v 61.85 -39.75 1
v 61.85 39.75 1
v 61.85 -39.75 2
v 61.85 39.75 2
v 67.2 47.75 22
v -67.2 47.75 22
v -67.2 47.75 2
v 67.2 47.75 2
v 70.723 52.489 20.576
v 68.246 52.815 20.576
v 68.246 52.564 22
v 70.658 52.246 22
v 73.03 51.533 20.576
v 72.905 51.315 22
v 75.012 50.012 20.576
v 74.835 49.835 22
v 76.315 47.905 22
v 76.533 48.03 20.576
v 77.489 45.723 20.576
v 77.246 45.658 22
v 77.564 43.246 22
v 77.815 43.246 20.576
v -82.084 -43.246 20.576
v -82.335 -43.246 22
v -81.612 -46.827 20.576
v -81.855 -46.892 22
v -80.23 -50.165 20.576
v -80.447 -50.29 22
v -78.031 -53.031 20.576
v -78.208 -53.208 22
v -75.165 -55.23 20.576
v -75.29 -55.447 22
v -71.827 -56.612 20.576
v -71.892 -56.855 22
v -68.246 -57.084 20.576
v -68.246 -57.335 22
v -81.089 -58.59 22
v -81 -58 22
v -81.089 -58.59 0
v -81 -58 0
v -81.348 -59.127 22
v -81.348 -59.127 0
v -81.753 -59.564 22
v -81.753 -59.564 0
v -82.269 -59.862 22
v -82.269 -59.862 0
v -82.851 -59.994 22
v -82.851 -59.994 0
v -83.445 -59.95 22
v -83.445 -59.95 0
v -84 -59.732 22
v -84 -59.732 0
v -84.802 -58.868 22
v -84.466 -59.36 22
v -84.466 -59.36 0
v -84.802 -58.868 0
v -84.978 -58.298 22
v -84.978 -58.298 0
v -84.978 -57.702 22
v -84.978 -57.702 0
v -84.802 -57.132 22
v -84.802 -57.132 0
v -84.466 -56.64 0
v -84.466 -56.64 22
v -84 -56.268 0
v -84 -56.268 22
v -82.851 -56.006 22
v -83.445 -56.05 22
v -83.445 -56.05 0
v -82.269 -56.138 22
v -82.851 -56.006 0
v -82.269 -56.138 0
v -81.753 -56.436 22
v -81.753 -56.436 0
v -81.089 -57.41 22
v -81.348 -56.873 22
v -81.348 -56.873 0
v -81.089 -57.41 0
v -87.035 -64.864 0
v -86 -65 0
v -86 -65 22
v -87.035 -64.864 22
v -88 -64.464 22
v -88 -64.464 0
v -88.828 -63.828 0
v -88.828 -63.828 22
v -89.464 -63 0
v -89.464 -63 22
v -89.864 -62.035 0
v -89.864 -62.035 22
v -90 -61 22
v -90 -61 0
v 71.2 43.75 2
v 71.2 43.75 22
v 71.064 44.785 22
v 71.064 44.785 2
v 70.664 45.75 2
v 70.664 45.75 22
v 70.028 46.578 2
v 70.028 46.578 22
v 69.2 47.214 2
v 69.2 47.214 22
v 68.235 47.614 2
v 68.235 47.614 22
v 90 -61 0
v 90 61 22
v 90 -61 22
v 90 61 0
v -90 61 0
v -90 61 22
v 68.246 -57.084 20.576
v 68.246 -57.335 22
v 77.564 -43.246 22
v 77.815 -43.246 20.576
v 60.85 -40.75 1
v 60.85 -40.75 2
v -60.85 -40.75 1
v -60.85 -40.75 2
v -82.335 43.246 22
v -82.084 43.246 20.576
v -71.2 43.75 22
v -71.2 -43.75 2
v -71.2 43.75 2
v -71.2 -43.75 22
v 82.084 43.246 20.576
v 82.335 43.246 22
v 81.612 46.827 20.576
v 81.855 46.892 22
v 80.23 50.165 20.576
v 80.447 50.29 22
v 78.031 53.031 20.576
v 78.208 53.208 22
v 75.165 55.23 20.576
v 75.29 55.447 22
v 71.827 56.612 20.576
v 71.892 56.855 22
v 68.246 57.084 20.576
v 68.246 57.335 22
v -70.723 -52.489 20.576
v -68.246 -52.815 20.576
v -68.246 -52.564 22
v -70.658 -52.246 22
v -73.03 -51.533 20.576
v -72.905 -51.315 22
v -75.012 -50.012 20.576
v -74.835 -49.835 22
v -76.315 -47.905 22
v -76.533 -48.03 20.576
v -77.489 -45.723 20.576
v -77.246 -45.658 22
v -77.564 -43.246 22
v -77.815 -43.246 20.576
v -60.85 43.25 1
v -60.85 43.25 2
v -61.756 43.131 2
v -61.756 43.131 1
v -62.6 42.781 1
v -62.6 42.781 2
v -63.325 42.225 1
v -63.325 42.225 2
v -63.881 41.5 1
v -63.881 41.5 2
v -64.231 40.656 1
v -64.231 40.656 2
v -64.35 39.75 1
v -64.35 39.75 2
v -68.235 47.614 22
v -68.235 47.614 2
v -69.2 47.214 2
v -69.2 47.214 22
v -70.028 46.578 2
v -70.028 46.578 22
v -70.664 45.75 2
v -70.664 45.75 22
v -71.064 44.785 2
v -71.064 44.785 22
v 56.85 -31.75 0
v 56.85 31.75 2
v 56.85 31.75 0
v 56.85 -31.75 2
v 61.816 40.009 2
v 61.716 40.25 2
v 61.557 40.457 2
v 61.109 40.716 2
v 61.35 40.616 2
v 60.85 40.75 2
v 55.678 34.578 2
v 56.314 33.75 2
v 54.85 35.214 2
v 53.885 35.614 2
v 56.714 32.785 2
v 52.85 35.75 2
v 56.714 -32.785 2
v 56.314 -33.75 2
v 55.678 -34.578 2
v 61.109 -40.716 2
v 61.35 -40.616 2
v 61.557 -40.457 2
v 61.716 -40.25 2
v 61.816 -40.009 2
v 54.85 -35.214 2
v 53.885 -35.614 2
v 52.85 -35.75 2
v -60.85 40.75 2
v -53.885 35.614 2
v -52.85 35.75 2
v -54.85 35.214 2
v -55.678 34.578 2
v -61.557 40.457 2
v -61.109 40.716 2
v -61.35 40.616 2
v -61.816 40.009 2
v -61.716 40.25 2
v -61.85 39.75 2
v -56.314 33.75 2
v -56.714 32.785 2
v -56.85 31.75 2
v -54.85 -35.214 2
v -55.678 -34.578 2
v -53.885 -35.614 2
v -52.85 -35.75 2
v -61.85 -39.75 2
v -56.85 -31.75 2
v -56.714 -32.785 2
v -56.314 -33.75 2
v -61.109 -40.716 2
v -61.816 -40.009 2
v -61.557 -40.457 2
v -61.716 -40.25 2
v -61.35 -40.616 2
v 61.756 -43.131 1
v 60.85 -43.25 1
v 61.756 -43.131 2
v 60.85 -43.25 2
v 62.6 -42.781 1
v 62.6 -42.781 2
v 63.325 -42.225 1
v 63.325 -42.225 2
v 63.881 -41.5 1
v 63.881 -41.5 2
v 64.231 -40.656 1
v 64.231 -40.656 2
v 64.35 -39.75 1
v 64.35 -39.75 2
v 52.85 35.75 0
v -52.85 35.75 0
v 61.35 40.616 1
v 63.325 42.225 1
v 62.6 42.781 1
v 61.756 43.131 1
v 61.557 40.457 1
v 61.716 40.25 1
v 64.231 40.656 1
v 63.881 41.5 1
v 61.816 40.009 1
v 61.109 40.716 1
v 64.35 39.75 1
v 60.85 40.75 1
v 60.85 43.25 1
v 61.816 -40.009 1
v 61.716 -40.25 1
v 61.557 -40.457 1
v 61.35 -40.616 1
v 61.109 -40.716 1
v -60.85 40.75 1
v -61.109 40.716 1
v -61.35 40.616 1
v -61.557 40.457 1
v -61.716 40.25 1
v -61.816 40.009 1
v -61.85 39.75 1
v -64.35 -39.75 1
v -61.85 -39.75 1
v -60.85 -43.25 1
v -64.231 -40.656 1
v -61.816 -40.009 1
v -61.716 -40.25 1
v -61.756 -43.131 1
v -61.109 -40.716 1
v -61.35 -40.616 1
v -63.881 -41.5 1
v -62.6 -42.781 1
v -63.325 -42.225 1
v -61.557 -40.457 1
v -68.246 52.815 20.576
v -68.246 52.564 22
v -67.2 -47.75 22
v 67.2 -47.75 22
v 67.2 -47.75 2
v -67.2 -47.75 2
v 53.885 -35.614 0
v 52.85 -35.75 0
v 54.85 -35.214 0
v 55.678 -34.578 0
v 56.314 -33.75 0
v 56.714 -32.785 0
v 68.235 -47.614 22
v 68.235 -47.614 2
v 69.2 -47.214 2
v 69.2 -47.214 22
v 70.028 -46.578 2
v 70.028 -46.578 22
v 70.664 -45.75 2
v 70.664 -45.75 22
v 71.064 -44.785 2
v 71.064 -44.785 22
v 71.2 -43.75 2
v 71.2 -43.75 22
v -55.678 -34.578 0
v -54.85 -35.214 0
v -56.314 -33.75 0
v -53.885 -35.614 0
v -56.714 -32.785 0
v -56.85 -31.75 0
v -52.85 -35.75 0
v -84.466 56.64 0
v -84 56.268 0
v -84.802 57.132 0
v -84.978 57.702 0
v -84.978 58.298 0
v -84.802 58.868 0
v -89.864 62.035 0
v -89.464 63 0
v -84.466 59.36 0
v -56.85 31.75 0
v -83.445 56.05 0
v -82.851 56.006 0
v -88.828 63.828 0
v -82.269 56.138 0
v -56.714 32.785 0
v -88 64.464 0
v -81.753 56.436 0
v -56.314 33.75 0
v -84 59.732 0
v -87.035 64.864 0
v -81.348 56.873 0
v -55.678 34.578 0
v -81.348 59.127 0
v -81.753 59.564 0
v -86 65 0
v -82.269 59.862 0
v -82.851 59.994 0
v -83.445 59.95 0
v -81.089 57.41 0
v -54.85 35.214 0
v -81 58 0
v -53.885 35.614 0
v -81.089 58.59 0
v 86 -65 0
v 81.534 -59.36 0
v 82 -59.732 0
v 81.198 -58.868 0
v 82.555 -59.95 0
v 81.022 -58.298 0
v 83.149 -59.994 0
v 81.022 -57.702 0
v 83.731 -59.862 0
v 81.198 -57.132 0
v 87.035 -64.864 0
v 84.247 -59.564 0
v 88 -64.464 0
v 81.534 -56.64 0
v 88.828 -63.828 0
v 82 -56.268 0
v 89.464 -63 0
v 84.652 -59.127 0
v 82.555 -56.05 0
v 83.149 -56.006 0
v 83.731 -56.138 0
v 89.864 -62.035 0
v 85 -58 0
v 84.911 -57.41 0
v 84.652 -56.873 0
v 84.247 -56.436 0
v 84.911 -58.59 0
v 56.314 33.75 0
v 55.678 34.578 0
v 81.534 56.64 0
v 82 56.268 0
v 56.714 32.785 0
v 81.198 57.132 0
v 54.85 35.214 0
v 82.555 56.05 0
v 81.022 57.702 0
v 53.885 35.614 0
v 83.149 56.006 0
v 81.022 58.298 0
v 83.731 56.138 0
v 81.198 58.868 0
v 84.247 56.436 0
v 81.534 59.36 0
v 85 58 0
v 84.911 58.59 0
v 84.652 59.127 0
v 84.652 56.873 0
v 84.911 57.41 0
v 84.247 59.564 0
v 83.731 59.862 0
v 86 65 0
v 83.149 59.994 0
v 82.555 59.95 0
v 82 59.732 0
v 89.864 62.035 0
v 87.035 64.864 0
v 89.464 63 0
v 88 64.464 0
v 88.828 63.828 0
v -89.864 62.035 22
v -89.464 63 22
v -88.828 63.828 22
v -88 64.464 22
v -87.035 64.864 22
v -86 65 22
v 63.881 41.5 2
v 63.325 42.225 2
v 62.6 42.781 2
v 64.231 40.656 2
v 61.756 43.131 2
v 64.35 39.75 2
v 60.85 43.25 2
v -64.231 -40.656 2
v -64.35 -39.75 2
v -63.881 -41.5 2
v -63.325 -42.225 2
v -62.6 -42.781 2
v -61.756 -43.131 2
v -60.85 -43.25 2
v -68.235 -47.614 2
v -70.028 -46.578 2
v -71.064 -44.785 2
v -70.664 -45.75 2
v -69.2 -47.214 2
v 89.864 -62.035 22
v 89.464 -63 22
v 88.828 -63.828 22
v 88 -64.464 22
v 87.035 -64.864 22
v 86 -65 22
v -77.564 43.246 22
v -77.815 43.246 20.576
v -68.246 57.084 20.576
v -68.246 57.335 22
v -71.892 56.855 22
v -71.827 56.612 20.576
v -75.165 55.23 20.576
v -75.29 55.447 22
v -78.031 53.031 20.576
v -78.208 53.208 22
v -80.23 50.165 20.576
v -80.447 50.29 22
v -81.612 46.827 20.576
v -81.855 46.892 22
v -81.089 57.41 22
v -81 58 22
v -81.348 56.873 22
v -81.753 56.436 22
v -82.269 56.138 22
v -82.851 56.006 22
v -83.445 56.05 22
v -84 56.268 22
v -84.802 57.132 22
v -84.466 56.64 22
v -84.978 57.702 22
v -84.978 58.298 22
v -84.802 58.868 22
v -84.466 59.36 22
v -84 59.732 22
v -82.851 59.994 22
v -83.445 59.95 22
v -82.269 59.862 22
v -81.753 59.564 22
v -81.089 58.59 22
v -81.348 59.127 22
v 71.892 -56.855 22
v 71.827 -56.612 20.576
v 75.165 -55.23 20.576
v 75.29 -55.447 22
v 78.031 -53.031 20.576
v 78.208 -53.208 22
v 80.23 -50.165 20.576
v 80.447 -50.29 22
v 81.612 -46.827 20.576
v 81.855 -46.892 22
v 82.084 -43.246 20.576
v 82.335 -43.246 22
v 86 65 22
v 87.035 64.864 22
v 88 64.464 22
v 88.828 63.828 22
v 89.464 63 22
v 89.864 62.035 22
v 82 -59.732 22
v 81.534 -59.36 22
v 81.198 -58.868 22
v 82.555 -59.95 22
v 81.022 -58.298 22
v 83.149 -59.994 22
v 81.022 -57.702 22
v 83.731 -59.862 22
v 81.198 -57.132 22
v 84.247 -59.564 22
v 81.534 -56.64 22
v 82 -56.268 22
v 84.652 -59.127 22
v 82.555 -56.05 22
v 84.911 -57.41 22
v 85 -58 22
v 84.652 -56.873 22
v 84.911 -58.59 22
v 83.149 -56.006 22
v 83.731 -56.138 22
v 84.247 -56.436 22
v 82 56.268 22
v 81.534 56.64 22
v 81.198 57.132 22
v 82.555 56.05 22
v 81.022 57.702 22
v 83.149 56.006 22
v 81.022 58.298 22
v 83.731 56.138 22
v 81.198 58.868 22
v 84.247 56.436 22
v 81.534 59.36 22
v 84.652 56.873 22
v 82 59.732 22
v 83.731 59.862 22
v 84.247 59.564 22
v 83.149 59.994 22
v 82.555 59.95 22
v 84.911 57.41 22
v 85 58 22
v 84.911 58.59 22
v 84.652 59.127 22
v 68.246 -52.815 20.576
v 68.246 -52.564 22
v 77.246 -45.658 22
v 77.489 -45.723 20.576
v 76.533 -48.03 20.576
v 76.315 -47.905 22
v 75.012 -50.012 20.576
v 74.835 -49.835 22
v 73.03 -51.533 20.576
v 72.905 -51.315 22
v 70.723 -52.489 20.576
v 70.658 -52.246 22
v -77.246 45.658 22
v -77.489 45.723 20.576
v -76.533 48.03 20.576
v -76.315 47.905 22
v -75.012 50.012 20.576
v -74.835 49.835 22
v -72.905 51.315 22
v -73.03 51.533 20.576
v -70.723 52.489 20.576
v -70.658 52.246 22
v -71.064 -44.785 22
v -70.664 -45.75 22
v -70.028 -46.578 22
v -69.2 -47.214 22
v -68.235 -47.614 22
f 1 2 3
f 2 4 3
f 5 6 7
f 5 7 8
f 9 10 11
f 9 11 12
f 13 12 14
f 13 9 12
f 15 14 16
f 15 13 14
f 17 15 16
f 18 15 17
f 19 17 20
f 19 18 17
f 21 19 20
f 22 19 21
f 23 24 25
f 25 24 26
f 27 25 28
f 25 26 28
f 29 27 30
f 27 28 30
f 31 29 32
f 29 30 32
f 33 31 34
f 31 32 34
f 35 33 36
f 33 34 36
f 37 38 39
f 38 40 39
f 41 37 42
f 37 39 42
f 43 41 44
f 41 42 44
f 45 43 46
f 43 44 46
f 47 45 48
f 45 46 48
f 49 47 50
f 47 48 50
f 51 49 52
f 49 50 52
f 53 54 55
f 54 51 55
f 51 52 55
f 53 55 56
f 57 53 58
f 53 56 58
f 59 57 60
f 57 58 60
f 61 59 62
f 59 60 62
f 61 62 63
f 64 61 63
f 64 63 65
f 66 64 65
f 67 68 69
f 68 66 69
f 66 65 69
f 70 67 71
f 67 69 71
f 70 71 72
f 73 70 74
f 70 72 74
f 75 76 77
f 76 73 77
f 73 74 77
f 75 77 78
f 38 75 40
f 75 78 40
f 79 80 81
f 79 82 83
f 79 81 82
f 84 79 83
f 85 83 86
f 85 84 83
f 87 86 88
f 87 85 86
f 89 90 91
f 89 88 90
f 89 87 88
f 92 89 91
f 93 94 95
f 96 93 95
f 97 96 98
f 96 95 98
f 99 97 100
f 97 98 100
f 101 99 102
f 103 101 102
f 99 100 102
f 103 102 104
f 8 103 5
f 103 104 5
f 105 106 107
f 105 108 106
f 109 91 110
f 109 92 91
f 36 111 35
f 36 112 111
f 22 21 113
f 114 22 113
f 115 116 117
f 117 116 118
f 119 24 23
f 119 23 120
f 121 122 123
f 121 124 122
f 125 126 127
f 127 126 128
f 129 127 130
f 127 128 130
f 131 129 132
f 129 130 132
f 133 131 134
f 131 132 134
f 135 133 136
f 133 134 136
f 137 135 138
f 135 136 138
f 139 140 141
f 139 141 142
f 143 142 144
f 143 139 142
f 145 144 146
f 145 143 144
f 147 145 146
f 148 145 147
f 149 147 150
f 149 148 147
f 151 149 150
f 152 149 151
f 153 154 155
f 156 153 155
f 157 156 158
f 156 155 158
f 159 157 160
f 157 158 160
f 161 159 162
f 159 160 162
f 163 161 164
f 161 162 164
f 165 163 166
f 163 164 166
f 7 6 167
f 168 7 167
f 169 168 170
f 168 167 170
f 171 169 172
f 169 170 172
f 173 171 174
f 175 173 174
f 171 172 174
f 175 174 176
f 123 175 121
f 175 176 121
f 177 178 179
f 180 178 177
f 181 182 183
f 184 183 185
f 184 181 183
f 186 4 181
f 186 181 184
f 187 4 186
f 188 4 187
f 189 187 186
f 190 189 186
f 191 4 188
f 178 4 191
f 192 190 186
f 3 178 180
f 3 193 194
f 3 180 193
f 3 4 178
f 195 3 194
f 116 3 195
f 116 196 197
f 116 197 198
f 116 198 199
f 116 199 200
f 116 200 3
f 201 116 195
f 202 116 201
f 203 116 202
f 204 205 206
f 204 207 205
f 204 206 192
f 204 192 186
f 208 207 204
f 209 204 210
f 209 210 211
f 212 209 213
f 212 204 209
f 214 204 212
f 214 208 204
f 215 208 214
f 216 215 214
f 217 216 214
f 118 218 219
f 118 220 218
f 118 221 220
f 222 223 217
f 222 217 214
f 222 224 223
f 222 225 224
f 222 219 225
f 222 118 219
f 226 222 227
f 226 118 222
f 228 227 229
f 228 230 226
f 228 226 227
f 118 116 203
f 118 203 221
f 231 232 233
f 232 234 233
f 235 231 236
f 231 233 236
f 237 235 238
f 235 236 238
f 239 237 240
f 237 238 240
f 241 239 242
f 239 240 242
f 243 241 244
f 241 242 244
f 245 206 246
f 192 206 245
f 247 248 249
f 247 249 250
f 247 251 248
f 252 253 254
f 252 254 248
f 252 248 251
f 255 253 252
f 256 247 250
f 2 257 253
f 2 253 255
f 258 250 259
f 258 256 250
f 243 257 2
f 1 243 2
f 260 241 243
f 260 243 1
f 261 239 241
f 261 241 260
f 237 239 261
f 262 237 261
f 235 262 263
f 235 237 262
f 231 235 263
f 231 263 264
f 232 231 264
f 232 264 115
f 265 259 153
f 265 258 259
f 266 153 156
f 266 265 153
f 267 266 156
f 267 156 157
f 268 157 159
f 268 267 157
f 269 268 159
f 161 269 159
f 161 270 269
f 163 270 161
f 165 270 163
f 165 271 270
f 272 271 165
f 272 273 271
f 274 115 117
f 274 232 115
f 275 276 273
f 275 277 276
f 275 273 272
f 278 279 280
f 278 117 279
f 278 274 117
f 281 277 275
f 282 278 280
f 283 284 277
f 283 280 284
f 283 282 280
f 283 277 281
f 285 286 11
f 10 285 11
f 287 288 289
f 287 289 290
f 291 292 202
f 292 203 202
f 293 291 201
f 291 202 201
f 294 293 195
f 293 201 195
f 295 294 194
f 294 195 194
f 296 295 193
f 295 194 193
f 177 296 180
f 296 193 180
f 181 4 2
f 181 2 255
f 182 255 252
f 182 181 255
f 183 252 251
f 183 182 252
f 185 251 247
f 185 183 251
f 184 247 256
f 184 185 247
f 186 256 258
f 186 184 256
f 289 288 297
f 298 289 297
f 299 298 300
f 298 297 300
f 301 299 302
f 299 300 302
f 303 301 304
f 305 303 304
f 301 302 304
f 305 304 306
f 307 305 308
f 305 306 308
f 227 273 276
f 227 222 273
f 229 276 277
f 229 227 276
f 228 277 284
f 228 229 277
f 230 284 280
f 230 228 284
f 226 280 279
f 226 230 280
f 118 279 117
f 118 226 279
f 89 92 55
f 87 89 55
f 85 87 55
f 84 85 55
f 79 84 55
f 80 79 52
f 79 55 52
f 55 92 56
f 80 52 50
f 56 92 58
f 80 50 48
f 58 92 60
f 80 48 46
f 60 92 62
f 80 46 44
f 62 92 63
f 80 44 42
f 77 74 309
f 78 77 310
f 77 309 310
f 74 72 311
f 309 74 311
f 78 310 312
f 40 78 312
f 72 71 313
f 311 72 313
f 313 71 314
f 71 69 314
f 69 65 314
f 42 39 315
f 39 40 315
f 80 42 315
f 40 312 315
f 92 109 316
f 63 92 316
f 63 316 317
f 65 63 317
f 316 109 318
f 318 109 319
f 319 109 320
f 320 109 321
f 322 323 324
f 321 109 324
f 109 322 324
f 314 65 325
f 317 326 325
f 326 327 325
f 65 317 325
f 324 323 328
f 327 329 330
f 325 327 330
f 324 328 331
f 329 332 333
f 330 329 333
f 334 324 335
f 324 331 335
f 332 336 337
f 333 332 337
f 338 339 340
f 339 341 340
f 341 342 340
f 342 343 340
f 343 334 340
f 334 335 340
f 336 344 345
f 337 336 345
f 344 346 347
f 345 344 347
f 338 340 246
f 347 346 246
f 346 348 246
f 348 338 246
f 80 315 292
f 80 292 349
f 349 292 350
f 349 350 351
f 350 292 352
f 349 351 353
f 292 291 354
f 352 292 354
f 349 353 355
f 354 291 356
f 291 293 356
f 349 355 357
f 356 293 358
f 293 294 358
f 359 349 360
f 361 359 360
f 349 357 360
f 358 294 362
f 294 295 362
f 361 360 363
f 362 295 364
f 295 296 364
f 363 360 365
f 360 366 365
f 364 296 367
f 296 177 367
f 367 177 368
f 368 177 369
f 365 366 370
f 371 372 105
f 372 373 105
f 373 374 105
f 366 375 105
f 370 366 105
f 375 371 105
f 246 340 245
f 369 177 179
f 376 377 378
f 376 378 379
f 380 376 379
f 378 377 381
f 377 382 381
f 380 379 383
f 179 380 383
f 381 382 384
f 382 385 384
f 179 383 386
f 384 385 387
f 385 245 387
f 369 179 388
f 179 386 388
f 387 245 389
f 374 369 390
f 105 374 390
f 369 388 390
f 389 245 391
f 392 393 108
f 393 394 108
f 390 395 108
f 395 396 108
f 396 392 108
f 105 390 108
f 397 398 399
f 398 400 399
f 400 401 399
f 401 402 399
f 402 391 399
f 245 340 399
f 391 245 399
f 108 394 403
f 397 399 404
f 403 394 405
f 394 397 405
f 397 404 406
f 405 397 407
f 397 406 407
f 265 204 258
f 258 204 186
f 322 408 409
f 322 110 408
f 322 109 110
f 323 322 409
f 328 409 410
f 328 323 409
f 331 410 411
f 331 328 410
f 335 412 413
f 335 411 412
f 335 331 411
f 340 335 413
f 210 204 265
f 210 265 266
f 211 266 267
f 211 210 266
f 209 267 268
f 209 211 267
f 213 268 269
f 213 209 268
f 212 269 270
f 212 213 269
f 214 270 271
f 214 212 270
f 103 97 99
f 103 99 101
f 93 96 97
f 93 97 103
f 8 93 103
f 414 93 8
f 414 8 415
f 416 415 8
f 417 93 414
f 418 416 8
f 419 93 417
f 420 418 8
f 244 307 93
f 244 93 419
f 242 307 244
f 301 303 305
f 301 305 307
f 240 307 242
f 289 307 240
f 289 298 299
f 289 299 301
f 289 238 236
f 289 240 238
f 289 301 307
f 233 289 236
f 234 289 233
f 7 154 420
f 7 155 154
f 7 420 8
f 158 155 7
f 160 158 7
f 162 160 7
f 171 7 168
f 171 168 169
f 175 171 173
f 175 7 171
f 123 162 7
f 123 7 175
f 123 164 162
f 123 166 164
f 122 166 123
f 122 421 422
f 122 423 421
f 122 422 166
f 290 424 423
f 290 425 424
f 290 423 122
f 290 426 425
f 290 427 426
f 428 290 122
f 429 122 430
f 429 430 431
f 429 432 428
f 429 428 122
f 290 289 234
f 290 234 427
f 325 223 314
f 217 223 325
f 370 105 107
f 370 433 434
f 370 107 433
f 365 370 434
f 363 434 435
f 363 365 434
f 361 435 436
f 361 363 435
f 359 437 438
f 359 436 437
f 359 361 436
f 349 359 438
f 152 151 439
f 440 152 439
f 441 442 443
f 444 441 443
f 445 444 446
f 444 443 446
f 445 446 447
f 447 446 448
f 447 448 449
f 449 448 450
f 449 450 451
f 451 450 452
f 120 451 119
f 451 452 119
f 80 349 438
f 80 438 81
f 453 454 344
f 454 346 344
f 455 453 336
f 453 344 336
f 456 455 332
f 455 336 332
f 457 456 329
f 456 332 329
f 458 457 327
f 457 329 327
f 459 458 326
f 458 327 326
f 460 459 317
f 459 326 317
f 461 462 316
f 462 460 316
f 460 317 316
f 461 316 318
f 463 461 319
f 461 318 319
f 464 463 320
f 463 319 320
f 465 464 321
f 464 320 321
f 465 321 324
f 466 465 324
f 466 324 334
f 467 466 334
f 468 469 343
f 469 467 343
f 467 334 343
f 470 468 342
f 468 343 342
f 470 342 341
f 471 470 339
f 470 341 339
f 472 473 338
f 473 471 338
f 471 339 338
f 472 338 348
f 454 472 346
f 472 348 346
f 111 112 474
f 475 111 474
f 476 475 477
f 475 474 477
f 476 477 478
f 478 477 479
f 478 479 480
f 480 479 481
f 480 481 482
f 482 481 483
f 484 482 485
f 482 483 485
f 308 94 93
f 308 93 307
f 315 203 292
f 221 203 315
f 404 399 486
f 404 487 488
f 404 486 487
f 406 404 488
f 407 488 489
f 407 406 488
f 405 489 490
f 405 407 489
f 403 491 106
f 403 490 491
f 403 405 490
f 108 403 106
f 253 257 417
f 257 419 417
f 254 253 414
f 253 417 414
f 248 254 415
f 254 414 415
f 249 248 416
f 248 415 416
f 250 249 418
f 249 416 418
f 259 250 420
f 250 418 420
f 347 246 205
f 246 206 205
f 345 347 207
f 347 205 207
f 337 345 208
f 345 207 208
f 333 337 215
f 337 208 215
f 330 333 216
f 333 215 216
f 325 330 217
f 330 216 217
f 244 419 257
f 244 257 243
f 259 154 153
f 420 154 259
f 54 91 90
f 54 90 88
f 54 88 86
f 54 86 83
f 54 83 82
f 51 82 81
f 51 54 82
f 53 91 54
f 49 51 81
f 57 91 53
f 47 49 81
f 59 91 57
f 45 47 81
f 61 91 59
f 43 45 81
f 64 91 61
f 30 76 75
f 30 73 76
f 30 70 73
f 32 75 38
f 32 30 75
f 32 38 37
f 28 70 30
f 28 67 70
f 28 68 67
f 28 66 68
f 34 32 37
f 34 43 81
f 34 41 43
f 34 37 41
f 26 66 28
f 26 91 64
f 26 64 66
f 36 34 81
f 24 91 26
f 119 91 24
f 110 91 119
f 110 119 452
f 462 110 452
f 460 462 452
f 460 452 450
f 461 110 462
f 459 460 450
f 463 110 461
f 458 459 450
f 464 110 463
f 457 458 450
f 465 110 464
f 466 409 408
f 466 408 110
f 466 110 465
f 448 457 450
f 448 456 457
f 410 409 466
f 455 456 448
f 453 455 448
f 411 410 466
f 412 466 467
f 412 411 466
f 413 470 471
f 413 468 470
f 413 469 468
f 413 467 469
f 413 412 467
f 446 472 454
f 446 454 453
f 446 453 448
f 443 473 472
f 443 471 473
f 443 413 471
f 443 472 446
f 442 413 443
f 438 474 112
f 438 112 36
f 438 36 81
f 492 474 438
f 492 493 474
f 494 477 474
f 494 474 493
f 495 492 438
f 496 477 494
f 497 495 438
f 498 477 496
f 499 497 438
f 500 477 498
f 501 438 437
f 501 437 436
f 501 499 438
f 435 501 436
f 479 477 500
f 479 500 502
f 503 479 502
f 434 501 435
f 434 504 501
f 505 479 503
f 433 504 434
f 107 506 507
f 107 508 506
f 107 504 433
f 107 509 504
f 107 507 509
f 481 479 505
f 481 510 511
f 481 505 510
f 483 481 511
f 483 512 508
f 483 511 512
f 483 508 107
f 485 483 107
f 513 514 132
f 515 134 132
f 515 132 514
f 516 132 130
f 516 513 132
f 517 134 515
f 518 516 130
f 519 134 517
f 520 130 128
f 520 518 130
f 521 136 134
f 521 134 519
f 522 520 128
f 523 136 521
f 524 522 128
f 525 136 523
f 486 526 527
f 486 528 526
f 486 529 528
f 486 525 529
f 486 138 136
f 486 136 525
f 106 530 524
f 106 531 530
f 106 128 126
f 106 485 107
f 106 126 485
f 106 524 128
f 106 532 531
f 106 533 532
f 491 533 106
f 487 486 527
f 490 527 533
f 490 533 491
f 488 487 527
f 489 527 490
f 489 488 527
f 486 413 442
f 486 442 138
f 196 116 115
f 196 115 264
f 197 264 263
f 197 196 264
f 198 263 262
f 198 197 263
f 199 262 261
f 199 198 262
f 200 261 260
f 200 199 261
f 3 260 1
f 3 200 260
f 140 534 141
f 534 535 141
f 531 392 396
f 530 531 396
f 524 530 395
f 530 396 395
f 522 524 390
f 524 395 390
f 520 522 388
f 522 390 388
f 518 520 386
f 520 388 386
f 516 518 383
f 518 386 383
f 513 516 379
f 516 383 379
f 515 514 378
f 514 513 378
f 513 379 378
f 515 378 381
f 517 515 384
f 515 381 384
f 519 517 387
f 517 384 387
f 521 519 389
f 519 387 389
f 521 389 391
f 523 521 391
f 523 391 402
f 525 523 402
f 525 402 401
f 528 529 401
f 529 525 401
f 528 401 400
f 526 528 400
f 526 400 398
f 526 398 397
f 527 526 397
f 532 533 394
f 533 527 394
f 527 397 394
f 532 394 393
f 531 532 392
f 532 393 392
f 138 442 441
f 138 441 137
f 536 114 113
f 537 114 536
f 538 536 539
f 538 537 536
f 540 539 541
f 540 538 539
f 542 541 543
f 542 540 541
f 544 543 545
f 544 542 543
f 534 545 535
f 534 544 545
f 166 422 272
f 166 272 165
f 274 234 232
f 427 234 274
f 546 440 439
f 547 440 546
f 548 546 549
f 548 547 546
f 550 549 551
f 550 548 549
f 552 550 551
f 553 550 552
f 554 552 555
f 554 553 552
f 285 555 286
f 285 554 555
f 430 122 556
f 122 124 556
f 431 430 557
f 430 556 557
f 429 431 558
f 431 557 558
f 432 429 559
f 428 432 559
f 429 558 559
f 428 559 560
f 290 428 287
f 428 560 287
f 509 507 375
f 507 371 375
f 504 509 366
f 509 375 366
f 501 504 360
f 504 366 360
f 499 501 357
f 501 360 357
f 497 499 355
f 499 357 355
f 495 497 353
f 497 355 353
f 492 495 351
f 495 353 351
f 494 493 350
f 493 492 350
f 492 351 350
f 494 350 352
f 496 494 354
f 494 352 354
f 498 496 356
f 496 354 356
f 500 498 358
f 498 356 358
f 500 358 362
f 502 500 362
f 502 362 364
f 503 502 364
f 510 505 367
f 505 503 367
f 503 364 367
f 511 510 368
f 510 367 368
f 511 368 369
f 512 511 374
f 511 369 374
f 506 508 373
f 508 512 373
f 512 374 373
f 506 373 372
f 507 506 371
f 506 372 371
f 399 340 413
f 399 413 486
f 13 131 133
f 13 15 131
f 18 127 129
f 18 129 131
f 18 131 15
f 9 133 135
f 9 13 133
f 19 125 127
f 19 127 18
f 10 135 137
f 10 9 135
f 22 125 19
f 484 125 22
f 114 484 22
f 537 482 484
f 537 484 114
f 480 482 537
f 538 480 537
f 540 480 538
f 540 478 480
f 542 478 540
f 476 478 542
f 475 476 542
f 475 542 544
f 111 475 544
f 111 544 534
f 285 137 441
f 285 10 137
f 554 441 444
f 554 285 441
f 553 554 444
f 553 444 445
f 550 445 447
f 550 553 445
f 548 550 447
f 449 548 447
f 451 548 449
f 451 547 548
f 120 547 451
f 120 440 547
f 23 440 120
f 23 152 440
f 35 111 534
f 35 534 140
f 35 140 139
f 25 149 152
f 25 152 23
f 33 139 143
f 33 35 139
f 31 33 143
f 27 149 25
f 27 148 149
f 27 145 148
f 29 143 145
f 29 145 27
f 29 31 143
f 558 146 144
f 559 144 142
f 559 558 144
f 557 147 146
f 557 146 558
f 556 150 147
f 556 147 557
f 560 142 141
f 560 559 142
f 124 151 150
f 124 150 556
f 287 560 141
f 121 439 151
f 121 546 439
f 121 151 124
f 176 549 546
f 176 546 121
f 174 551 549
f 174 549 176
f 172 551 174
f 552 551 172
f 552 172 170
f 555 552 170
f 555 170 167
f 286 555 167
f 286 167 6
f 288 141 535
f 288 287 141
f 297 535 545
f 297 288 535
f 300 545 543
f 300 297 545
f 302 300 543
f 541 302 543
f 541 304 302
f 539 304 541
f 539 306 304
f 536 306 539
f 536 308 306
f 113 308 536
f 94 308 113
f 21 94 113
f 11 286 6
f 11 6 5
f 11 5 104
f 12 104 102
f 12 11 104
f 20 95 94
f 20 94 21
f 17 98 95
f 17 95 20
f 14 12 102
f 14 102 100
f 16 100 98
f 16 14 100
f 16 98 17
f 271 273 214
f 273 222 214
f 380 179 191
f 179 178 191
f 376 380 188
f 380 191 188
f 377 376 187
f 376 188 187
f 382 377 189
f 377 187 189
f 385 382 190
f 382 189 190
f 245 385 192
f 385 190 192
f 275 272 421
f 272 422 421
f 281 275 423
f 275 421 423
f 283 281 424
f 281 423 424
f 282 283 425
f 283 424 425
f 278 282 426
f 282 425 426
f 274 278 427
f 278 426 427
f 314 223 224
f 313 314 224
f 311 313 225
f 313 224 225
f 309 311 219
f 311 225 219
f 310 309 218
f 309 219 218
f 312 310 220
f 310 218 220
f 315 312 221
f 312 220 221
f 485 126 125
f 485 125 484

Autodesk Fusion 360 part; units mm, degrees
sketch "Sketch1" plane through (0, 0, 0) normal (0, 0, 1) x (1, 0, 0)
  line L0 (86, -65) -> (-86, -65)
  line L1 (-90, -61) -> (-90, 61)
  line L2 (-86, 65) -> (86, 65)
  line L3 (90, 61) -> (90, -61)
  line L4 (90, -65) -> (-90, 65) construction
  line L5 (-90, -65) -> (90, 65) construction
  arc A0 (-86, 65) -> (-90, 61) centre (-86, 61) ccw
  arc A1 (90, 61) -> (86, 65) centre (86, 61) ccw
  arc A2 (86, -65) -> (90, -61) centre (86, -61) ccw
  arc A3 (-90, -61) -> (-86, -65) centre (-86, -61) ccw
  circle A4 centre (-83, 58) radius 2
  line L6 (0, 65) -> (0, -65) construction
  line L7 (90, 0) -> (-90, 0) construction
  circle A5 centre (83, 58) radius 2
  circle A6 centre (83, -58) radius 2
  circle A7 centre (-83, -58) radius 2
  dimension "d1" = 180
  dimension "d2" = 130
  dimension "d26" = 4
  dimension "d27" = 4
  dimension "d28" = 4
  dimension "d29" = 4
  dimension "d30" = 4
  dimension "d31" = 7
  dimension "d32" = 7
extrude "Extrude1" add sketch "Sketch1" along normal blind 22
sketch "Sketch2" plane through (0, 0, 22) normal (0, 0, 1) x (-1, 0, 0)
  line L0 (-86, -65) -> (86, -65)
  line L1 (90, -61) -> (90, 61)
  line L2 (86, 65) -> (-86, 65)
  line L3 (-90, 61) -> (-90, -61)
  line L4 (-67.2, 47.75) -> (67.2, 47.75)
  line L5 (71.2, 43.75) -> (71.2, -43.75)
  line L6 (67.2, -47.75) -> (-67.2, -47.75)
  line L7 (-71.2, -43.75) -> (-71.2, 43.75)
  line L8 (-71.2, 47.75) -> (71.2, -47.75) construction
  line L9 (71.2, 47.75) -> (-71.2, -47.75) construction
  arc A0 (86, -65) -> (90, -61) centre (86, -61) ccw
  arc A1 (90, 61) -> (86, 65) centre (86, 61) ccw
  arc A2 (-86, 65) -> (-90, 61) centre (-86, 61) ccw
  arc A3 (-90, -61) -> (-86, -65) centre (-86, -61) ccw
  circle A4 centre (83, 58) radius 2
  circle A5 centre (-83, 58) radius 2
  circle A6 centre (-83, -58) radius 2
  circle A7 centre (83, -58) radius 2
  arc A8 (67.2, -47.75) -> (71.2, -43.75) centre (67.2, -43.75) ccw
  arc A9 (-71.2, -43.75) -> (-67.2, -47.75) centre (-67.2, -43.75) ccw
  arc A10 (71.2, 43.75) -> (67.2, 47.75) centre (67.2, 43.75) ccw
  arc A11 (-67.2, 47.75) -> (-71.2, 43.75) centre (-67.2, 43.75) ccw
  dimension "d5" = 142.4
  dimension "d6" = 95.5
  dimension "d52" = 4
  dimension "d53" = 4
  dimension "d54" = 4
  dimension "d55" = 4
extrude "Extrude2" cut sketch "Sketch2" against normal blind 20 contours L4 L5 L6 L7 A8 A9 A10 A11
sketch "Sketch3" plane through (0, 0, 22) normal (0, 0, 1) x (-1, 0, 0)
  line L0 (71.2, 43.75) -> (71.2, -43.75)
  line L1 (67.2, -47.75) -> (-67.2, -47.75)
  line L2 (-71.2, -43.75) -> (-71.2, 43.75)
  line L3 (-67.2, 47.75) -> (67.2, 47.75)
  line L4 (-86, -65) -> (86, -65)
  line L5 (90, -61) -> (90, 61)
  line L6 (86, 65) -> (-86, 65)
  line L7 (-90, 61) -> (-90, -61)
  line L8 (-79.9494, 54.9494) -> (79.9494, 54.9494) construction
  line L9 (79.9494, 54.9494) -> (79.9494, -54.9494) construction
  line L10 (79.9494, -54.9494) -> (-79.9494, -54.9494) construction
  line L11 (-79.9494, -54.9494) -> (-79.9494, 54.9494) construction
  line L12 (-79.9494, 54.9494) -> (79.9494, -54.9494) construction
  line L13 (79.9494, 54.9494) -> (-79.9494, -54.9494) construction
  line L14 (77.8149, 43.2459) -> (77.8149, -43.2459)
  line L15 (68.2459, -52.8149) -> (-68.2459, -52.8149)
  line L16 (-77.8149, -43.2459) -> (-77.8149, 43.2459)
  line L17 (-69.6267, 47.2574) -> (77.8149, -52.8149) construction
  line L18 (70.6619, 45.6619) -> (-70.6619, -45.6619) construction
  line L19 (-68.2459, 57.0839) -> (68.2459, 57.0839)
  line L20 (82.0839, 43.2459) -> (82.0839, -43.2459)
  line L21 (68.2459, -57.0839) -> (-68.2459, -57.0839)
  line L22 (-82.0839, -43.2459) -> (-82.0839, 43.2459)
  line L23 (-72.3401, 50.3077) -> (82.0839, -57.0839) construction
  line L24 (73.5309, 48.5309) -> (-73.5309, -48.5309) construction
  arc A0 (68.2459, -52.8149) -> (77.8149, -43.2459) centre (68.2459, -43.2459) ccw
  arc A1 (68.2459, -57.0839) -> (82.0839, -43.2459) centre (68.2459, -43.2459) ccw
  line L25 (0, -65) -> (0, 65) construction
  line L26 (-90, 0) -> (90, 0) construction
  arc A2 (-77.8149, -43.2459) -> (-68.2459, -52.8149) centre (-68.2459, -43.2459) ccw
  arc A3 (-82.0839, -43.2459) -> (-68.2459, -57.0839) centre (-68.2459, -43.2459) ccw
  arc A4 (-68.2459, 52.8149) -> (-77.8149, 43.2459) centre (-68.2459, 43.2459) ccw
  arc A5 (-68.2459, 57.0839) -> (-82.0839, 43.2459) centre (-68.2459, 43.2459) ccw
  arc A6 (77.8149, 43.2459) -> (68.2459, 52.8149) centre (68.2459, 43.2459) ccw
  arc A7 (82.0839, 43.2459) -> (68.2459, 57.0839) centre (68.2459, 43.2459) ccw
  line L27 (-68.2459, 52.8149) -> (68.2459, 52.8149)
  arc A8 (86, -65) -> (90, -61) centre (86, -61) ccw
  arc A9 (90, 61) -> (86, 65) centre (86, 61) ccw
  arc A10 (-86, 65) -> (-90, 61) centre (-86, 61) ccw
  arc A11 (-90, -61) -> (-86, -65) centre (-86, -61) ccw
  circle A12 centre (83, 58) radius 2
  circle A13 centre (-83, 58) radius 2
  circle A14 centre (-83, -58) radius 2
  circle A15 centre (83, -58) radius 2
  arc A16 (71.2, 43.75) -> (67.2, 47.75) centre (67.2, 43.75) ccw
  arc A17 (67.2, -47.75) -> (71.2, -43.75) centre (67.2, -43.75) ccw
  arc A18 (-71.2, -43.75) -> (-67.2, -47.75) centre (-67.2, -43.75) ccw
  arc A19 (-67.2, 47.75) -> (-71.2, 43.75) centre (-67.2, 43.75) ccw
  dimension "d9" = 159.8988
  dimension "d15" = 109.8988
  dimension "d16" = 2.1345
  dimension "d17" = 2.1345
  dimension "d18" = 2.1345
  dimension "d19" = 2.1345
  dimension "d20" = 9.569
  dimension "d21" = 13.838
extrude "Extrude3" cut sketch "Sketch3" against normal blind 1.424 contours L19 L20 L21 L22 A1 A3 A5 A7
draft "Draft1" angle 10 neutral plane through (0, 0, 20.576) pull (0, 0, 1) 16 faces at (-77.8149, -14.4153, 21.5253) (-71.8024, 52.1295, 21.0507) (-22.7486, 52.8149, 21.5253) (72.6307, 51.7512, 21.0507) (77.8149, 14.4153, 21.5253) (73.0304, -51.5329, 21.0507) (22.7486, -52.8149, 21.5253) (-77.1295, -46.8024, 21.0507) (-82.0839, -14.4153, 21.5253) (-76.2727, -54.518, 21.0507) (-22.7486, -57.0839, 21.0507) (82.0213, -44.5613, 21.0507) (82.0839, 14.4153, 21.5253) (77.7952, 53.2609, 21.0507) (22.7486, 57.0839, 21.0507) (-76.8, 54.1233, 21.0507)
sketch "Sketch6" plane through (0, 0, 2) normal (0, 0, 1) x (-1, 0, 0)
  arc A0 (71.2, 43.75) -> (67.2, 47.75) centre (67.2, 43.75) ccw
  line L0 (67.2, 47.75) -> (-67.2, 47.75)
  arc A1 (-67.2, 47.75) -> (-71.2, 43.75) centre (-67.2, 43.75) ccw
  line L1 (-71.2, 43.75) -> (-71.2, -43.75)
  arc A2 (-71.2, -43.75) -> (-67.2, -47.75) centre (-67.2, -43.75) ccw
  line L2 (-67.2, -47.75) -> (67.2, -47.75)
  arc A3 (67.2, -47.75) -> (71.2, -43.75) centre (67.2, -43.75) ccw
  line L3 (71.2, -43.75) -> (71.2, 43.75)
  arc A4 (60.9079, -41.3399) -> (62.4799, -39.7679) centre (60.9079, -39.7679) ccw construction
  arc A5 (-62.4799, -39.7399) -> (-60.9079, -41.3119) centre (-60.9079, -39.7399) ccw construction
  line L4 (-48.9575, -41.8399) -> (48.9575, -41.8399) construction
  line L5 (48.9575, 41.8399) -> (-48.9575, 41.8399) construction
  line L6 (-62.9799, 29.7119) -> (-62.9799, 27.8175) construction
  line L7 (48.9575, -41.8399) -> (50.8519, -41.8399) construction
  line L8 (62.4799, 30.3078) -> (62.4799, 39.7679) construction
  arc A6 (-60.88, 42.74) -> (-63.88, 39.74) centre (-60.88, 39.74) ccw construction
  line L9 (63.88, 39.74) -> (63.88, -39.74) construction
  arc A7 (63.88, 39.74) -> (60.88, 42.74) centre (60.88, 39.74) ccw construction
  line L10 (-62.9799, -29.7119) -> (-62.4799, -30.3078) construction
  line L11 (51.4478, 41.3399) -> (50.8519, 41.8399) construction
  arc A8 (60.88, -42.74) -> (63.88, -39.74) centre (60.88, -39.74) ccw construction
  line L12 (-48.9575, 41.8399) -> (-50.8519, 41.8399) construction
  line L13 (-60.88, 42.74) -> (60.88, 42.74) construction
  line L14 (-62.9799, -27.8175) -> (-62.9799, -29.7119) construction
  line L15 (60.88, -42.74) -> (-60.88, -42.74) construction
  line L16 (62.9799, 29.7119) -> (62.4799, 30.3078) construction
  line L17 (-50.8519, 41.8399) -> (-51.4811, 41.3119) construction
  line L18 (62.4799, -39.7679) -> (62.4799, -30.3078) construction
  line L19 (-50.8519, -41.8399) -> (-48.9575, -41.8399) construction
  line L20 (60.9079, 41.3399) -> (51.4478, 41.3399) construction
  line L21 (50.8519, 41.8399) -> (48.9575, 41.8399) construction
  line L22 (62.9799, 27.8175) -> (62.9799, 29.7119) construction
  line L23 (51.4478, -41.3399) -> (60.9079, -41.3399) construction
  line L24 (62.9799, -27.8175) -> (62.9799, 27.8175) construction
  line L25 (-63.88, -39.74) -> (-63.88, 39.74) construction
  line L26 (50.8519, -41.8399) -> (51.4478, -41.3399) construction
  line L27 (62.9799, -29.7119) -> (62.9799, -27.8175) construction
  arc A9 (-63.88, -39.74) -> (-60.88, -42.74) centre (-60.88, -39.74) ccw construction
  arc A10 (62.4799, 39.7679) -> (60.9079, 41.3399) centre (60.9079, 39.7679) ccw construction
  line L28 (62.4799, -30.3078) -> (62.9799, -29.7119) construction
  line L29 (-62.4799, 30.3078) -> (-62.9799, 29.7119) construction
  line L30 (-60.9079, -41.3119) -> (-51.4811, -41.3119) construction
  arc A11 (-60.9079, 41.3119) -> (-62.4799, 39.7399) centre (-60.9079, 39.7399) ccw construction
  line L31 (-51.4811, -41.3119) -> (-50.8519, -41.8399) construction
  line L32 (-51.4811, 41.3119) -> (-60.9079, 41.3119) construction
  line L33 (-62.4799, 39.7399) -> (-62.4799, 30.3078) construction
  line L34 (-62.4799, -30.3078) -> (-62.4799, -39.7399) construction
  line L35 (-62.9799, 27.8175) -> (-62.9799, -27.8175) construction
  line L36 (0, -47.75) -> (0, 47.75) construction
  line L37 (-71.2, 0) -> (71.2, 0) construction
  line L38 (-60.85, 43.25) -> (60.85, 43.25)
  line L39 (64.35, 39.75) -> (64.35, -39.75)
  line L40 (60.85, -43.25) -> (-60.85, -43.25)
  line L41 (-64.35, -39.75) -> (-64.35, 39.75)
  line L42 (-64.35, 43.25) -> (64.35, -43.25) construction
  line L43 (64.35, 43.25) -> (-64.35, -43.25) construction
  arc A12 (60.85, -43.25) -> (64.35, -39.75) centre (60.85, -39.75) ccw
  arc A13 (-64.35, -39.75) -> (-60.85, -43.25) centre (-60.85, -39.75) ccw
  arc A14 (-60.85, 43.25) -> (-64.35, 39.75) centre (-60.85, 39.75) ccw
  arc A15 (64.35, 39.75) -> (60.85, 43.25) centre (60.85, 39.75) ccw
  line L44 (-60.85, 40.75) -> (60.85, 40.75)
  line L45 (61.85, 39.75) -> (61.85, -39.75)
  line L46 (60.85, -40.75) -> (-60.85, -40.75)
  line L47 (-61.85, -39.75) -> (-61.85, 39.75)
  line L48 (-61.85, 40.75) -> (61.85, -40.75) construction
  line L49 (61.85, 40.75) -> (-61.85, -40.75) construction
  arc A16 (-61.85, -39.75) -> (-60.85, -40.75) centre (-60.85, -39.75) ccw
  arc A17 (60.85, -40.75) -> (61.85, -39.75) centre (60.85, -39.75) ccw
  arc A18 (61.85, 39.75) -> (60.85, 40.75) centre (60.85, 39.75) ccw
  arc A19 (-60.85, 40.75) -> (-61.85, 39.75) centre (-60.85, 39.75) ccw
  dimension "d56" = 128.7
  dimension "d57" = 86.5
  dimension "d58" = 3.5
  dimension "d59" = 3.5
  dimension "d60" = 3.5
  dimension "d61" = 3.5
  dimension "d63" = 2.5
  dimension "d64" = 2.5
  dimension "d65" = 1
  dimension "d66" = 1
  dimension "d67" = 1
  dimension "d68" = 1
extrude "Extrude7" cut sketch "Sketch6" against normal blind 1 contours L38 L39 L40 L41 A12 A13 A14 A15
sketch "Sketch4" plane through (0, 0, 2) normal (0, 0, 1) x (-1, 0, 0)
  line L0 (-67.2, -47.75) -> (67.2, -47.75)
  line L1 (71.2, -43.75) -> (71.2, 43.75)
  line L2 (67.2, 47.75) -> (-67.2, 47.75)
  line L3 (-71.2, 43.75) -> (-71.2, -43.75)
  line L4 (-52.85, 35.75) -> (52.85, 35.75)
  line L5 (56.85, 31.75) -> (56.85, -31.75)
  line L6 (52.85, -35.75) -> (-52.85, -35.75)
  line L7 (-56.85, -31.75) -> (-56.85, 31.75)
  line L8 (-56.85, 35.75) -> (56.85, -35.75) construction
  line L9 (56.85, 35.75) -> (-56.85, -35.75) construction
  arc A0 (71.2, 43.75) -> (67.2, 47.75) centre (67.2, 43.75) ccw
  arc A1 (-67.2, 47.75) -> (-71.2, 43.75) centre (-67.2, 43.75) ccw
  arc A2 (-71.2, -43.75) -> (-67.2, -47.75) centre (-67.2, -43.75) ccw
  arc A3 (67.2, -47.75) -> (71.2, -43.75) centre (67.2, -43.75) ccw
  arc A4 (52.85, -35.75) -> (56.85, -31.75) centre (52.85, -31.75) ccw
  arc A5 (-56.85, -31.75) -> (-52.85, -35.75) centre (-52.85, -31.75) ccw
  arc A6 (-52.85, 35.75) -> (-56.85, 31.75) centre (-52.85, 31.75) ccw
  arc A7 (56.85, 31.75) -> (52.85, 35.75) centre (52.85, 31.75) ccw
  line L10 (64.35, 39.75) -> (64.35, -39.75)
  arc A8 (60.85, -43.25) -> (64.35, -39.75) centre (60.85, -39.75) ccw
  line L11 (60.85, -43.25) -> (-60.85, -43.25)
  arc A9 (-64.35, -39.75) -> (-60.85, -43.25) centre (-60.85, -39.75) ccw
  line L12 (-64.35, -39.75) -> (-64.35, 39.75)
  arc A10 (-60.85, 43.25) -> (-64.35, 39.75) centre (-60.85, 39.75) ccw
  line L13 (-60.85, 43.25) -> (60.85, 43.25)
  arc A11 (64.35, 39.75) -> (60.85, 43.25) centre (60.85, 39.75) ccw
  line L14 (61.85, -39.75) -> (61.85, 39.75)
  arc A12 (61.85, 39.75) -> (60.85, 40.75) centre (60.85, 39.75) ccw
  line L15 (60.85, 40.75) -> (-60.85, 40.75)
  arc A13 (-60.85, 40.75) -> (-61.85, 39.75) centre (-60.85, 39.75) ccw
  line L16 (-61.85, 39.75) -> (-61.85, -39.75)
  arc A14 (-61.85, -39.75) -> (-60.85, -40.75) centre (-60.85, -39.75) ccw
  line L17 (-60.85, -40.75) -> (60.85, -40.75)
  arc A15 (60.85, -40.75) -> (61.85, -39.75) centre (60.85, -39.75) ccw
  dimension "d71" = 4
  dimension "d72" = 4
  dimension "d73" = 4
  dimension "d74" = 4
  dimension "d77" = 5
  dimension "d78" = 5
extrude "Extrude8" cut sketch "Sketch4" against normal blind 5 contours L4 L5 L6 L7 A4 A5 A6 A7
equation "d9 = ( ORingPerimeter - 100 mm ) / 4 + 50 mm"
equation "ORingDiameter = 1.78 mm" comment "Diamter of the O ring"
equation "ORingInnerDiameter = 170 mm" comment "Inner diamter of the o ring bore"
equation "ORingPerimeter = 2 * 3.1412 * ( ( ORingInnerDiameter / 2 ) + ORingDiameter / 2 )"
equation "PanelWidth = 80 mm"
equation "PanelLength = 115 mm"
equation "d15 = ( ORingPerimeter - 100 mm ) / 4"
equation "d16 = ( ( ORingDiameter * 1.05 ) / 2 ) + 1.2 mm"
equation "d17 = ( ( ORingDiameter * 1.05 ) / 2 ) + 1.2 mm"
equation "d18 = ( ( ORingDiameter * 1.05 ) / 2 ) + 1.2 mm"
equation "d19 = ( ( ORingDiameter * 1.05 ) / 2 ) + 1.2 mm"
equation "d20 = ( ORingDiameter ) * 6 + ORingDiameter * 0.05 - 1.2 mm"
equation "d21 = ( ORingDiameter ) * 6 + ( ORingDiameter * 1.1 ) + 1.2 mm"
equation "d22 = -ORingDiameter * 0.8"
equation "d30 = Bolt_Diam"
equation "ORing2Diameter = 2 mm" comment "Second O ring Diameter"
equation "ORing2InnerDiameter = 126 mm" comment "Inner diameter of the second O Ring"
equation "ORing2Perimeter = 2 * 3.1412 * ( ( ORing2InnerDiameter / 2 ) + ORing2Diameter / 2 )"
equation "Bolt_Diam = 4 mm" comment "Diameter of the bolt"
equation "Bolt_Head_Height = 4 mm" comment "height of the bolt head"
equation "Bolt_Head_Diam = 7.22 mm" comment "Diameter of the bolt head"
